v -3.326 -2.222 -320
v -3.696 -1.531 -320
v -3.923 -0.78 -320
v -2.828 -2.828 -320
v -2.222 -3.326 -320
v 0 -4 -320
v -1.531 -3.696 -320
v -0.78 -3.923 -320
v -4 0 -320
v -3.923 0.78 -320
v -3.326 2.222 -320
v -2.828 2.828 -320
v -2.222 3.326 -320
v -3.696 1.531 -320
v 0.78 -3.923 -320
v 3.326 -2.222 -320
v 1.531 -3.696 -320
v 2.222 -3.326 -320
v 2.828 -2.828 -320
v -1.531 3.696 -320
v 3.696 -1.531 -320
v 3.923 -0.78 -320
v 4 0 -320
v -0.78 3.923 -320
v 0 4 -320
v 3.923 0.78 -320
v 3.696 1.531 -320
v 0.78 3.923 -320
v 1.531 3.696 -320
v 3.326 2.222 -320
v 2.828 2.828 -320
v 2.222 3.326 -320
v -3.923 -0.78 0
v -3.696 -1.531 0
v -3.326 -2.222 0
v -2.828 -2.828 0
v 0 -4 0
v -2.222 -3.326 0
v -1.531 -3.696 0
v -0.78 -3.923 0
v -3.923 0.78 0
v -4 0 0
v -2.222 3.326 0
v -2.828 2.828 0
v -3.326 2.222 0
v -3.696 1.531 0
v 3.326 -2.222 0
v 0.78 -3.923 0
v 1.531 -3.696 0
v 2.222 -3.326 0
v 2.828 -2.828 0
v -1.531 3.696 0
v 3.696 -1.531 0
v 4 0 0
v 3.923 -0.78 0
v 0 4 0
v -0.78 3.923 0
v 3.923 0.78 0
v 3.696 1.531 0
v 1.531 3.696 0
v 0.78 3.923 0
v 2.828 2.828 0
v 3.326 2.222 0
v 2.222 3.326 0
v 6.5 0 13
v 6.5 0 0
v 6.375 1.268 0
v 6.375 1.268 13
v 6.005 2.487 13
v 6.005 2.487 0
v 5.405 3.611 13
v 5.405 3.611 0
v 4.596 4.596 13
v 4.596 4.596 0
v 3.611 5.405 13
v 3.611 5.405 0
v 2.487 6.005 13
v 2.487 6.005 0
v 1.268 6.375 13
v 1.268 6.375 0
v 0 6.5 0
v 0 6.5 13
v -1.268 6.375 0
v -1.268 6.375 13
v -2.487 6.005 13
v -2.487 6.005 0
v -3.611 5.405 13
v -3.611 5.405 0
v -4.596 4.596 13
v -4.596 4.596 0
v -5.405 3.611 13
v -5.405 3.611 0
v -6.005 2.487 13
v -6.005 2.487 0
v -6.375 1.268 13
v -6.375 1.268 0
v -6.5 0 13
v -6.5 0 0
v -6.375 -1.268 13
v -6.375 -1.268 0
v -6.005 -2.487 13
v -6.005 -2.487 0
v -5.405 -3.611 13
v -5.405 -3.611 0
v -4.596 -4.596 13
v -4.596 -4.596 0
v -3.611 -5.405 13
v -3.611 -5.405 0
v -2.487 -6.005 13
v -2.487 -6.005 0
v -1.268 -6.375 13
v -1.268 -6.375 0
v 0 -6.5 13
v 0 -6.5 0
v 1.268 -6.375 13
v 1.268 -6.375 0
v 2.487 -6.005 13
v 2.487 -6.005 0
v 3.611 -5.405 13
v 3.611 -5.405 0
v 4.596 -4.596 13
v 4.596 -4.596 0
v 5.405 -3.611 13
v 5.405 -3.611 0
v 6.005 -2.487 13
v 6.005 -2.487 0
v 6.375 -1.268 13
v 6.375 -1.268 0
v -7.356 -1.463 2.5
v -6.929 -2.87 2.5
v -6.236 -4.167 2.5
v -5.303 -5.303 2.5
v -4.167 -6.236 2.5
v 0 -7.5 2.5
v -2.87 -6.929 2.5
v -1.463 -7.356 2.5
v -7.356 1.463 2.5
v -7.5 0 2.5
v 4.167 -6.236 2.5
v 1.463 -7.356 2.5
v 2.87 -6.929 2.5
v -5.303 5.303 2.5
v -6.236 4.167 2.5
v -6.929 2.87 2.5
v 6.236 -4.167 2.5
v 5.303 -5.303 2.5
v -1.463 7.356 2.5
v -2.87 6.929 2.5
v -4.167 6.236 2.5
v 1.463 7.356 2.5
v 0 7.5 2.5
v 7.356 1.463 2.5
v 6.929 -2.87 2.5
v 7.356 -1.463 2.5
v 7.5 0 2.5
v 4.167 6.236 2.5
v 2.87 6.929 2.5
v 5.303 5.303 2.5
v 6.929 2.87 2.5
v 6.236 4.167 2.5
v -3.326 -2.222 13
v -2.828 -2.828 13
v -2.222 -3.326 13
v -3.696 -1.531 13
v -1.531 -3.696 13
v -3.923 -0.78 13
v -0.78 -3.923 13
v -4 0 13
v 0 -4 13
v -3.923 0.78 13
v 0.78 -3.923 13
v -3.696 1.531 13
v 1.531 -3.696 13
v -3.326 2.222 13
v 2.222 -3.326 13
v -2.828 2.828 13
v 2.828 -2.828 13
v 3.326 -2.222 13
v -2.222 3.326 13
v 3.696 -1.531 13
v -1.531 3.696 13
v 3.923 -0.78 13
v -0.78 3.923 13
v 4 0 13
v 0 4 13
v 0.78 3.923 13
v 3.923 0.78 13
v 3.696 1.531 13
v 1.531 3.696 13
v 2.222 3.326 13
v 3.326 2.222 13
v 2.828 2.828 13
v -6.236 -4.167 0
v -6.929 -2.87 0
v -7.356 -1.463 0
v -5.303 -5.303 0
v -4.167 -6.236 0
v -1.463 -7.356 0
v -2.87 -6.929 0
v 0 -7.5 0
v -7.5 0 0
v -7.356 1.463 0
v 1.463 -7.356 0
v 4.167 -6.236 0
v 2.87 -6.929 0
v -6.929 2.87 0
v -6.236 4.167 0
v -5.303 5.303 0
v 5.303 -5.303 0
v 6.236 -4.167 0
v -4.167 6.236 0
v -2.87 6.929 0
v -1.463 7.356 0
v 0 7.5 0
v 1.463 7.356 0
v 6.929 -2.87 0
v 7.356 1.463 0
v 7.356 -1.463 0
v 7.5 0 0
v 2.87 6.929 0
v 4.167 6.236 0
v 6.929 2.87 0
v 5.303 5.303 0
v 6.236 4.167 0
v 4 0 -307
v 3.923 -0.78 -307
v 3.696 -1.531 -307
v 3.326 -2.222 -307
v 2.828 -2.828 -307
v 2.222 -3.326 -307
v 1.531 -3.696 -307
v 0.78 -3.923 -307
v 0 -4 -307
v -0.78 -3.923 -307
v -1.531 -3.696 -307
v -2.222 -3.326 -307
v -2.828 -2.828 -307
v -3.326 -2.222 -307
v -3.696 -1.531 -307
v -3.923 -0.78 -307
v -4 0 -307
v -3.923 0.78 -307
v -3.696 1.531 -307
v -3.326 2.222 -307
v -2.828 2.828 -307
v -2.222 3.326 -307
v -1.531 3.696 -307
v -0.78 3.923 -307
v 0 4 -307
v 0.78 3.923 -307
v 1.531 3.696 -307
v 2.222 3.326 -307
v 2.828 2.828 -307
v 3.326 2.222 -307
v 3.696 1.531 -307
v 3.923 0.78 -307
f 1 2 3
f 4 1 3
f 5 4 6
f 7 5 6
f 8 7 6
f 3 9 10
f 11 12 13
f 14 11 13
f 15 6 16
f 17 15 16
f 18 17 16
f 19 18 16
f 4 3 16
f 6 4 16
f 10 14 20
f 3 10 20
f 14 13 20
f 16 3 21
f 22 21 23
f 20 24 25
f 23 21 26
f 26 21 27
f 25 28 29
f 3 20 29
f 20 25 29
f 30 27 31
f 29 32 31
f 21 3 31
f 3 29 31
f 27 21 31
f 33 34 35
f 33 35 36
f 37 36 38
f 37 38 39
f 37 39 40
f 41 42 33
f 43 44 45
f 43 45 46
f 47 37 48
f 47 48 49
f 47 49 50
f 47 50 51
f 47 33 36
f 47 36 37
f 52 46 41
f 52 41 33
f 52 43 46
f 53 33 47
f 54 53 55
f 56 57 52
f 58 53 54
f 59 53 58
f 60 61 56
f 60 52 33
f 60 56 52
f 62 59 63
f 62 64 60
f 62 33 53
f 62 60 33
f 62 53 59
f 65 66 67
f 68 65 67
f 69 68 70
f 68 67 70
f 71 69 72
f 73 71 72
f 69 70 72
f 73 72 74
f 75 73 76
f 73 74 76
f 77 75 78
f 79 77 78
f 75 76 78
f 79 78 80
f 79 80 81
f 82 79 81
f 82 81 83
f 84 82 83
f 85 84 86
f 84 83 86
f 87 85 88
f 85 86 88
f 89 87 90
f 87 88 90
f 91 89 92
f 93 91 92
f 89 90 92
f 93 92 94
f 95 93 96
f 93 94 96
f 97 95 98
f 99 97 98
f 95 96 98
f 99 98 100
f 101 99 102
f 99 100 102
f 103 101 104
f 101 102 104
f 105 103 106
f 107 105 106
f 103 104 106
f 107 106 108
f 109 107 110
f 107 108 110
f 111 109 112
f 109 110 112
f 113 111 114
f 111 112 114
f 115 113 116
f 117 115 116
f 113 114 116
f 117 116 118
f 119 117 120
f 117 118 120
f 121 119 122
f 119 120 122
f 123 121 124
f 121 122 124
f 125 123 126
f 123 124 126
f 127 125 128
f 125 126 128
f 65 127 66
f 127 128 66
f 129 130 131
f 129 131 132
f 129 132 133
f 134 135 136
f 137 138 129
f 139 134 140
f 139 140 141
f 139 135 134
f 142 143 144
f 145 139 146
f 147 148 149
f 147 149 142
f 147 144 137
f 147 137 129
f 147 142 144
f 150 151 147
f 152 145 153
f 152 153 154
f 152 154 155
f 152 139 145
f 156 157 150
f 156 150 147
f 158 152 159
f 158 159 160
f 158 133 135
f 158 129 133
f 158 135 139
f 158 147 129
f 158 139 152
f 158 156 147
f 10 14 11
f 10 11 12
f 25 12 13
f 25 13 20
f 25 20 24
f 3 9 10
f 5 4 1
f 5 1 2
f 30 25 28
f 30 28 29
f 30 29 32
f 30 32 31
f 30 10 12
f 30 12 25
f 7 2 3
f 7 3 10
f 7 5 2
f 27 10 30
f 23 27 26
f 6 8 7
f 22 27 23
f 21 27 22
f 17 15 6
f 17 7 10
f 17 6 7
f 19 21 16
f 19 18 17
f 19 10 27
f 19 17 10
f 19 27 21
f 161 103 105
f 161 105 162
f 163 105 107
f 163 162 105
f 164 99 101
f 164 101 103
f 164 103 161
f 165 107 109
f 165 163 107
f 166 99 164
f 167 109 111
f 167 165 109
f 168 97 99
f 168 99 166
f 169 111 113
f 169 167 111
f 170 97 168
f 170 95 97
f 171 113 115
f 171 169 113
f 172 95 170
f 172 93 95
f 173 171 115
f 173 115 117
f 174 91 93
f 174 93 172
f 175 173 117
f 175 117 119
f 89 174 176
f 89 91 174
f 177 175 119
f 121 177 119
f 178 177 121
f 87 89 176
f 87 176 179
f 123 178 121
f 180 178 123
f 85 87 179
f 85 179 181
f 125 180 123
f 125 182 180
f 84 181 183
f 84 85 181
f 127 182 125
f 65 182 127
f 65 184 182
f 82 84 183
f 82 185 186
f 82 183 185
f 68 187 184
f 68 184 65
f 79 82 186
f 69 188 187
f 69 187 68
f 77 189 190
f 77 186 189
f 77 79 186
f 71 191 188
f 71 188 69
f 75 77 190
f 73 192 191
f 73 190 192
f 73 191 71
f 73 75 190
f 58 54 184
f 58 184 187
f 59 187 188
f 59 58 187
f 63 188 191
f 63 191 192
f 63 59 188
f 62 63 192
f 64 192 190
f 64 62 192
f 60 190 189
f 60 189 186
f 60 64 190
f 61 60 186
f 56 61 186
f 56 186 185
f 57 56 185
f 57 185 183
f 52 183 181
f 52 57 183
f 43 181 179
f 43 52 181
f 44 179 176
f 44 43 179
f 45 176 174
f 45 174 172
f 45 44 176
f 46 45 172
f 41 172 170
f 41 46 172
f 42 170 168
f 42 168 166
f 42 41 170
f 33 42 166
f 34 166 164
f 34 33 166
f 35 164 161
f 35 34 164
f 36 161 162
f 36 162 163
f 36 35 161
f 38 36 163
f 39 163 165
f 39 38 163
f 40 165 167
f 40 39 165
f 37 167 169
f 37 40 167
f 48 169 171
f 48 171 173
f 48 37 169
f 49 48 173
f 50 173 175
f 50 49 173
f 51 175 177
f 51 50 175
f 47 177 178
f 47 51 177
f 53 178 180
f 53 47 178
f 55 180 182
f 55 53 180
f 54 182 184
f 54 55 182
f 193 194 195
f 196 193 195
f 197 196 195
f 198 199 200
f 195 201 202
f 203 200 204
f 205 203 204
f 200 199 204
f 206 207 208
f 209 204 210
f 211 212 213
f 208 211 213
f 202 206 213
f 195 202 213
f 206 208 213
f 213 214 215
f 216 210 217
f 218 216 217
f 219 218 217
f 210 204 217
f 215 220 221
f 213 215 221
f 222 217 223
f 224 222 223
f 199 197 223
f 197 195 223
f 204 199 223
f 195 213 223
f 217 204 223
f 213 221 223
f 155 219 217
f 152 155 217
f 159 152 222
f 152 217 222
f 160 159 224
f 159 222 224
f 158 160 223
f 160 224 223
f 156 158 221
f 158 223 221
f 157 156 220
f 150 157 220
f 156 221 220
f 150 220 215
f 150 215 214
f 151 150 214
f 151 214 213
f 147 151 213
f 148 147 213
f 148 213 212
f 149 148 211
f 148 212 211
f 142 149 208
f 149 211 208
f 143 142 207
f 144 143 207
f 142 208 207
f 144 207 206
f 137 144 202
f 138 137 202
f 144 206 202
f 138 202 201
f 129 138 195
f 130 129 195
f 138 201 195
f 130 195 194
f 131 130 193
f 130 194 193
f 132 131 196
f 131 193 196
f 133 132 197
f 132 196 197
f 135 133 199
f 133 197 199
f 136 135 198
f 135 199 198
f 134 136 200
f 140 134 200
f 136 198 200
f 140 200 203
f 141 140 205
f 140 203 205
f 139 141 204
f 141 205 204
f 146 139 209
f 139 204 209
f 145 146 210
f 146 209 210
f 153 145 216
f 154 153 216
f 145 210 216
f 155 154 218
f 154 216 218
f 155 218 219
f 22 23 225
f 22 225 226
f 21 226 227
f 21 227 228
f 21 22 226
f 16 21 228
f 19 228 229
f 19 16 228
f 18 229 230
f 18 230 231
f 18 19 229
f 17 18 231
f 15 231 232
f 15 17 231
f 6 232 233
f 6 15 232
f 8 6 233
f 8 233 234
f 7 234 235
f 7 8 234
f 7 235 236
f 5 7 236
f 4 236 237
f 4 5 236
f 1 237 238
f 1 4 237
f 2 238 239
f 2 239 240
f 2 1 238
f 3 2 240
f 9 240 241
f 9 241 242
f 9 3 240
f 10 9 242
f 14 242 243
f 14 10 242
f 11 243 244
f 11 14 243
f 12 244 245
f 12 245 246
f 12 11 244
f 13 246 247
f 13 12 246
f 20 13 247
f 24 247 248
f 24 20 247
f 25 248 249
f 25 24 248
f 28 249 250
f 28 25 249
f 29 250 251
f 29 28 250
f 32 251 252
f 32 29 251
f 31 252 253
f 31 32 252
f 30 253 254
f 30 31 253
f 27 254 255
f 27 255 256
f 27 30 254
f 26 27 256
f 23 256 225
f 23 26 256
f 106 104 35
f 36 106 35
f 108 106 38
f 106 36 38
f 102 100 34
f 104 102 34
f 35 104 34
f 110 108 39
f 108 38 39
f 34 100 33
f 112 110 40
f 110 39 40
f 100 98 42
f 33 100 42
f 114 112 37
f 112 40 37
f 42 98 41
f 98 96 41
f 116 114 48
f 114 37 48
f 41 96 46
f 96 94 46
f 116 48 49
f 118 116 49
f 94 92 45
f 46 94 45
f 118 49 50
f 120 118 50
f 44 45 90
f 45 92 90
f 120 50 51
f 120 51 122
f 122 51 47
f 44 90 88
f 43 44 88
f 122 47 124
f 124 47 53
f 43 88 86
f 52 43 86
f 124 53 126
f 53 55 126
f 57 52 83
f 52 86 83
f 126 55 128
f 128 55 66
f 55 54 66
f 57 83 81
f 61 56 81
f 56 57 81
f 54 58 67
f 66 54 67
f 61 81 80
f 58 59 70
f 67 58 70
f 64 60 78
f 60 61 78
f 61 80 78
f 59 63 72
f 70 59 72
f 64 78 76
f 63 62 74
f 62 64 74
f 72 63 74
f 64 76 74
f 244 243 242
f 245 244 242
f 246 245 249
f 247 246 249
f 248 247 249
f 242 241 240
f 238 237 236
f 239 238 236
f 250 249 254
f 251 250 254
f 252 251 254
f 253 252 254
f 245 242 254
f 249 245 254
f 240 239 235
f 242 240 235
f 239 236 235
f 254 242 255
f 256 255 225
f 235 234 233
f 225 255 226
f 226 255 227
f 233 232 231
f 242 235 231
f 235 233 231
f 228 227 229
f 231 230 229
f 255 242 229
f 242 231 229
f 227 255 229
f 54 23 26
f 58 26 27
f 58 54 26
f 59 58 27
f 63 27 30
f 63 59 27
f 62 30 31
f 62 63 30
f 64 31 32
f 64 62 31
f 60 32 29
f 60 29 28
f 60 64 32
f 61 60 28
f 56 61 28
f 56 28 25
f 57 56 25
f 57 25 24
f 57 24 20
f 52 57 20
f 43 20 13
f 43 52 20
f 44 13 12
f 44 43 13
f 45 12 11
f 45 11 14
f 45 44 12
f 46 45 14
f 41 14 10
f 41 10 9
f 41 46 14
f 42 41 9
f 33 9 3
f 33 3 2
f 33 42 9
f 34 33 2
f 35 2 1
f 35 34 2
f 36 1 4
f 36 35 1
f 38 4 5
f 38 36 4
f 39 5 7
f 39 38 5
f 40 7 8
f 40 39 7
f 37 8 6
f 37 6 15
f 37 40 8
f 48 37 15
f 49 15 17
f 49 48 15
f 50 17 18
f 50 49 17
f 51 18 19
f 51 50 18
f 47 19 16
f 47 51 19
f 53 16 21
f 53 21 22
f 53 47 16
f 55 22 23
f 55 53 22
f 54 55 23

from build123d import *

# Parameters (mm, degrees)
F0_R      = 7.5
F0_R_2    = 6.5
F0_R_3    = 4
F1_DEPTH  = 2.5
F2_DEPTH  = 320
F2_FACE_R = 4
F3_DEPTH  = 13


with BuildPart() as f1:
    # F0 (on Top) → F1 (new body)
    with BuildSketch(Plane.XY):
        Circle(F0_R)
        Circle(F0_R_2, mode=Mode.SUBTRACT)
        Circle(F0_R_2)
        Circle(F0_R_3, mode=Mode.SUBTRACT)
        Circle(F0_R_3)
    extrude(amount=F1_DEPTH)


with BuildPart() as f2:
    # F0 (on Top) → F2 (new body)
    with BuildSketch(Plane.XY):
        Circle(F0_R_3)
    extrude(amount=-F2_DEPTH)


with BuildPart() as f3:
    # F0 (on Top) + F2_face (on face) → F3 (new body)
    with BuildSketch(Plane.XY):
        Circle(F0_R_2)
        Circle(F0_R_3, mode=Mode.SUBTRACT)
    with BuildSketch(Plane(origin=(0, 0, -320), x_dir=(1, 0, 0), z_dir=(0, 0, -1))):
        Circle(F2_FACE_R)
    extrude(amount=F3_DEPTH, dir=(0, 0, 1))


solid = Compound([f1.part, f2.part, f3.part])
